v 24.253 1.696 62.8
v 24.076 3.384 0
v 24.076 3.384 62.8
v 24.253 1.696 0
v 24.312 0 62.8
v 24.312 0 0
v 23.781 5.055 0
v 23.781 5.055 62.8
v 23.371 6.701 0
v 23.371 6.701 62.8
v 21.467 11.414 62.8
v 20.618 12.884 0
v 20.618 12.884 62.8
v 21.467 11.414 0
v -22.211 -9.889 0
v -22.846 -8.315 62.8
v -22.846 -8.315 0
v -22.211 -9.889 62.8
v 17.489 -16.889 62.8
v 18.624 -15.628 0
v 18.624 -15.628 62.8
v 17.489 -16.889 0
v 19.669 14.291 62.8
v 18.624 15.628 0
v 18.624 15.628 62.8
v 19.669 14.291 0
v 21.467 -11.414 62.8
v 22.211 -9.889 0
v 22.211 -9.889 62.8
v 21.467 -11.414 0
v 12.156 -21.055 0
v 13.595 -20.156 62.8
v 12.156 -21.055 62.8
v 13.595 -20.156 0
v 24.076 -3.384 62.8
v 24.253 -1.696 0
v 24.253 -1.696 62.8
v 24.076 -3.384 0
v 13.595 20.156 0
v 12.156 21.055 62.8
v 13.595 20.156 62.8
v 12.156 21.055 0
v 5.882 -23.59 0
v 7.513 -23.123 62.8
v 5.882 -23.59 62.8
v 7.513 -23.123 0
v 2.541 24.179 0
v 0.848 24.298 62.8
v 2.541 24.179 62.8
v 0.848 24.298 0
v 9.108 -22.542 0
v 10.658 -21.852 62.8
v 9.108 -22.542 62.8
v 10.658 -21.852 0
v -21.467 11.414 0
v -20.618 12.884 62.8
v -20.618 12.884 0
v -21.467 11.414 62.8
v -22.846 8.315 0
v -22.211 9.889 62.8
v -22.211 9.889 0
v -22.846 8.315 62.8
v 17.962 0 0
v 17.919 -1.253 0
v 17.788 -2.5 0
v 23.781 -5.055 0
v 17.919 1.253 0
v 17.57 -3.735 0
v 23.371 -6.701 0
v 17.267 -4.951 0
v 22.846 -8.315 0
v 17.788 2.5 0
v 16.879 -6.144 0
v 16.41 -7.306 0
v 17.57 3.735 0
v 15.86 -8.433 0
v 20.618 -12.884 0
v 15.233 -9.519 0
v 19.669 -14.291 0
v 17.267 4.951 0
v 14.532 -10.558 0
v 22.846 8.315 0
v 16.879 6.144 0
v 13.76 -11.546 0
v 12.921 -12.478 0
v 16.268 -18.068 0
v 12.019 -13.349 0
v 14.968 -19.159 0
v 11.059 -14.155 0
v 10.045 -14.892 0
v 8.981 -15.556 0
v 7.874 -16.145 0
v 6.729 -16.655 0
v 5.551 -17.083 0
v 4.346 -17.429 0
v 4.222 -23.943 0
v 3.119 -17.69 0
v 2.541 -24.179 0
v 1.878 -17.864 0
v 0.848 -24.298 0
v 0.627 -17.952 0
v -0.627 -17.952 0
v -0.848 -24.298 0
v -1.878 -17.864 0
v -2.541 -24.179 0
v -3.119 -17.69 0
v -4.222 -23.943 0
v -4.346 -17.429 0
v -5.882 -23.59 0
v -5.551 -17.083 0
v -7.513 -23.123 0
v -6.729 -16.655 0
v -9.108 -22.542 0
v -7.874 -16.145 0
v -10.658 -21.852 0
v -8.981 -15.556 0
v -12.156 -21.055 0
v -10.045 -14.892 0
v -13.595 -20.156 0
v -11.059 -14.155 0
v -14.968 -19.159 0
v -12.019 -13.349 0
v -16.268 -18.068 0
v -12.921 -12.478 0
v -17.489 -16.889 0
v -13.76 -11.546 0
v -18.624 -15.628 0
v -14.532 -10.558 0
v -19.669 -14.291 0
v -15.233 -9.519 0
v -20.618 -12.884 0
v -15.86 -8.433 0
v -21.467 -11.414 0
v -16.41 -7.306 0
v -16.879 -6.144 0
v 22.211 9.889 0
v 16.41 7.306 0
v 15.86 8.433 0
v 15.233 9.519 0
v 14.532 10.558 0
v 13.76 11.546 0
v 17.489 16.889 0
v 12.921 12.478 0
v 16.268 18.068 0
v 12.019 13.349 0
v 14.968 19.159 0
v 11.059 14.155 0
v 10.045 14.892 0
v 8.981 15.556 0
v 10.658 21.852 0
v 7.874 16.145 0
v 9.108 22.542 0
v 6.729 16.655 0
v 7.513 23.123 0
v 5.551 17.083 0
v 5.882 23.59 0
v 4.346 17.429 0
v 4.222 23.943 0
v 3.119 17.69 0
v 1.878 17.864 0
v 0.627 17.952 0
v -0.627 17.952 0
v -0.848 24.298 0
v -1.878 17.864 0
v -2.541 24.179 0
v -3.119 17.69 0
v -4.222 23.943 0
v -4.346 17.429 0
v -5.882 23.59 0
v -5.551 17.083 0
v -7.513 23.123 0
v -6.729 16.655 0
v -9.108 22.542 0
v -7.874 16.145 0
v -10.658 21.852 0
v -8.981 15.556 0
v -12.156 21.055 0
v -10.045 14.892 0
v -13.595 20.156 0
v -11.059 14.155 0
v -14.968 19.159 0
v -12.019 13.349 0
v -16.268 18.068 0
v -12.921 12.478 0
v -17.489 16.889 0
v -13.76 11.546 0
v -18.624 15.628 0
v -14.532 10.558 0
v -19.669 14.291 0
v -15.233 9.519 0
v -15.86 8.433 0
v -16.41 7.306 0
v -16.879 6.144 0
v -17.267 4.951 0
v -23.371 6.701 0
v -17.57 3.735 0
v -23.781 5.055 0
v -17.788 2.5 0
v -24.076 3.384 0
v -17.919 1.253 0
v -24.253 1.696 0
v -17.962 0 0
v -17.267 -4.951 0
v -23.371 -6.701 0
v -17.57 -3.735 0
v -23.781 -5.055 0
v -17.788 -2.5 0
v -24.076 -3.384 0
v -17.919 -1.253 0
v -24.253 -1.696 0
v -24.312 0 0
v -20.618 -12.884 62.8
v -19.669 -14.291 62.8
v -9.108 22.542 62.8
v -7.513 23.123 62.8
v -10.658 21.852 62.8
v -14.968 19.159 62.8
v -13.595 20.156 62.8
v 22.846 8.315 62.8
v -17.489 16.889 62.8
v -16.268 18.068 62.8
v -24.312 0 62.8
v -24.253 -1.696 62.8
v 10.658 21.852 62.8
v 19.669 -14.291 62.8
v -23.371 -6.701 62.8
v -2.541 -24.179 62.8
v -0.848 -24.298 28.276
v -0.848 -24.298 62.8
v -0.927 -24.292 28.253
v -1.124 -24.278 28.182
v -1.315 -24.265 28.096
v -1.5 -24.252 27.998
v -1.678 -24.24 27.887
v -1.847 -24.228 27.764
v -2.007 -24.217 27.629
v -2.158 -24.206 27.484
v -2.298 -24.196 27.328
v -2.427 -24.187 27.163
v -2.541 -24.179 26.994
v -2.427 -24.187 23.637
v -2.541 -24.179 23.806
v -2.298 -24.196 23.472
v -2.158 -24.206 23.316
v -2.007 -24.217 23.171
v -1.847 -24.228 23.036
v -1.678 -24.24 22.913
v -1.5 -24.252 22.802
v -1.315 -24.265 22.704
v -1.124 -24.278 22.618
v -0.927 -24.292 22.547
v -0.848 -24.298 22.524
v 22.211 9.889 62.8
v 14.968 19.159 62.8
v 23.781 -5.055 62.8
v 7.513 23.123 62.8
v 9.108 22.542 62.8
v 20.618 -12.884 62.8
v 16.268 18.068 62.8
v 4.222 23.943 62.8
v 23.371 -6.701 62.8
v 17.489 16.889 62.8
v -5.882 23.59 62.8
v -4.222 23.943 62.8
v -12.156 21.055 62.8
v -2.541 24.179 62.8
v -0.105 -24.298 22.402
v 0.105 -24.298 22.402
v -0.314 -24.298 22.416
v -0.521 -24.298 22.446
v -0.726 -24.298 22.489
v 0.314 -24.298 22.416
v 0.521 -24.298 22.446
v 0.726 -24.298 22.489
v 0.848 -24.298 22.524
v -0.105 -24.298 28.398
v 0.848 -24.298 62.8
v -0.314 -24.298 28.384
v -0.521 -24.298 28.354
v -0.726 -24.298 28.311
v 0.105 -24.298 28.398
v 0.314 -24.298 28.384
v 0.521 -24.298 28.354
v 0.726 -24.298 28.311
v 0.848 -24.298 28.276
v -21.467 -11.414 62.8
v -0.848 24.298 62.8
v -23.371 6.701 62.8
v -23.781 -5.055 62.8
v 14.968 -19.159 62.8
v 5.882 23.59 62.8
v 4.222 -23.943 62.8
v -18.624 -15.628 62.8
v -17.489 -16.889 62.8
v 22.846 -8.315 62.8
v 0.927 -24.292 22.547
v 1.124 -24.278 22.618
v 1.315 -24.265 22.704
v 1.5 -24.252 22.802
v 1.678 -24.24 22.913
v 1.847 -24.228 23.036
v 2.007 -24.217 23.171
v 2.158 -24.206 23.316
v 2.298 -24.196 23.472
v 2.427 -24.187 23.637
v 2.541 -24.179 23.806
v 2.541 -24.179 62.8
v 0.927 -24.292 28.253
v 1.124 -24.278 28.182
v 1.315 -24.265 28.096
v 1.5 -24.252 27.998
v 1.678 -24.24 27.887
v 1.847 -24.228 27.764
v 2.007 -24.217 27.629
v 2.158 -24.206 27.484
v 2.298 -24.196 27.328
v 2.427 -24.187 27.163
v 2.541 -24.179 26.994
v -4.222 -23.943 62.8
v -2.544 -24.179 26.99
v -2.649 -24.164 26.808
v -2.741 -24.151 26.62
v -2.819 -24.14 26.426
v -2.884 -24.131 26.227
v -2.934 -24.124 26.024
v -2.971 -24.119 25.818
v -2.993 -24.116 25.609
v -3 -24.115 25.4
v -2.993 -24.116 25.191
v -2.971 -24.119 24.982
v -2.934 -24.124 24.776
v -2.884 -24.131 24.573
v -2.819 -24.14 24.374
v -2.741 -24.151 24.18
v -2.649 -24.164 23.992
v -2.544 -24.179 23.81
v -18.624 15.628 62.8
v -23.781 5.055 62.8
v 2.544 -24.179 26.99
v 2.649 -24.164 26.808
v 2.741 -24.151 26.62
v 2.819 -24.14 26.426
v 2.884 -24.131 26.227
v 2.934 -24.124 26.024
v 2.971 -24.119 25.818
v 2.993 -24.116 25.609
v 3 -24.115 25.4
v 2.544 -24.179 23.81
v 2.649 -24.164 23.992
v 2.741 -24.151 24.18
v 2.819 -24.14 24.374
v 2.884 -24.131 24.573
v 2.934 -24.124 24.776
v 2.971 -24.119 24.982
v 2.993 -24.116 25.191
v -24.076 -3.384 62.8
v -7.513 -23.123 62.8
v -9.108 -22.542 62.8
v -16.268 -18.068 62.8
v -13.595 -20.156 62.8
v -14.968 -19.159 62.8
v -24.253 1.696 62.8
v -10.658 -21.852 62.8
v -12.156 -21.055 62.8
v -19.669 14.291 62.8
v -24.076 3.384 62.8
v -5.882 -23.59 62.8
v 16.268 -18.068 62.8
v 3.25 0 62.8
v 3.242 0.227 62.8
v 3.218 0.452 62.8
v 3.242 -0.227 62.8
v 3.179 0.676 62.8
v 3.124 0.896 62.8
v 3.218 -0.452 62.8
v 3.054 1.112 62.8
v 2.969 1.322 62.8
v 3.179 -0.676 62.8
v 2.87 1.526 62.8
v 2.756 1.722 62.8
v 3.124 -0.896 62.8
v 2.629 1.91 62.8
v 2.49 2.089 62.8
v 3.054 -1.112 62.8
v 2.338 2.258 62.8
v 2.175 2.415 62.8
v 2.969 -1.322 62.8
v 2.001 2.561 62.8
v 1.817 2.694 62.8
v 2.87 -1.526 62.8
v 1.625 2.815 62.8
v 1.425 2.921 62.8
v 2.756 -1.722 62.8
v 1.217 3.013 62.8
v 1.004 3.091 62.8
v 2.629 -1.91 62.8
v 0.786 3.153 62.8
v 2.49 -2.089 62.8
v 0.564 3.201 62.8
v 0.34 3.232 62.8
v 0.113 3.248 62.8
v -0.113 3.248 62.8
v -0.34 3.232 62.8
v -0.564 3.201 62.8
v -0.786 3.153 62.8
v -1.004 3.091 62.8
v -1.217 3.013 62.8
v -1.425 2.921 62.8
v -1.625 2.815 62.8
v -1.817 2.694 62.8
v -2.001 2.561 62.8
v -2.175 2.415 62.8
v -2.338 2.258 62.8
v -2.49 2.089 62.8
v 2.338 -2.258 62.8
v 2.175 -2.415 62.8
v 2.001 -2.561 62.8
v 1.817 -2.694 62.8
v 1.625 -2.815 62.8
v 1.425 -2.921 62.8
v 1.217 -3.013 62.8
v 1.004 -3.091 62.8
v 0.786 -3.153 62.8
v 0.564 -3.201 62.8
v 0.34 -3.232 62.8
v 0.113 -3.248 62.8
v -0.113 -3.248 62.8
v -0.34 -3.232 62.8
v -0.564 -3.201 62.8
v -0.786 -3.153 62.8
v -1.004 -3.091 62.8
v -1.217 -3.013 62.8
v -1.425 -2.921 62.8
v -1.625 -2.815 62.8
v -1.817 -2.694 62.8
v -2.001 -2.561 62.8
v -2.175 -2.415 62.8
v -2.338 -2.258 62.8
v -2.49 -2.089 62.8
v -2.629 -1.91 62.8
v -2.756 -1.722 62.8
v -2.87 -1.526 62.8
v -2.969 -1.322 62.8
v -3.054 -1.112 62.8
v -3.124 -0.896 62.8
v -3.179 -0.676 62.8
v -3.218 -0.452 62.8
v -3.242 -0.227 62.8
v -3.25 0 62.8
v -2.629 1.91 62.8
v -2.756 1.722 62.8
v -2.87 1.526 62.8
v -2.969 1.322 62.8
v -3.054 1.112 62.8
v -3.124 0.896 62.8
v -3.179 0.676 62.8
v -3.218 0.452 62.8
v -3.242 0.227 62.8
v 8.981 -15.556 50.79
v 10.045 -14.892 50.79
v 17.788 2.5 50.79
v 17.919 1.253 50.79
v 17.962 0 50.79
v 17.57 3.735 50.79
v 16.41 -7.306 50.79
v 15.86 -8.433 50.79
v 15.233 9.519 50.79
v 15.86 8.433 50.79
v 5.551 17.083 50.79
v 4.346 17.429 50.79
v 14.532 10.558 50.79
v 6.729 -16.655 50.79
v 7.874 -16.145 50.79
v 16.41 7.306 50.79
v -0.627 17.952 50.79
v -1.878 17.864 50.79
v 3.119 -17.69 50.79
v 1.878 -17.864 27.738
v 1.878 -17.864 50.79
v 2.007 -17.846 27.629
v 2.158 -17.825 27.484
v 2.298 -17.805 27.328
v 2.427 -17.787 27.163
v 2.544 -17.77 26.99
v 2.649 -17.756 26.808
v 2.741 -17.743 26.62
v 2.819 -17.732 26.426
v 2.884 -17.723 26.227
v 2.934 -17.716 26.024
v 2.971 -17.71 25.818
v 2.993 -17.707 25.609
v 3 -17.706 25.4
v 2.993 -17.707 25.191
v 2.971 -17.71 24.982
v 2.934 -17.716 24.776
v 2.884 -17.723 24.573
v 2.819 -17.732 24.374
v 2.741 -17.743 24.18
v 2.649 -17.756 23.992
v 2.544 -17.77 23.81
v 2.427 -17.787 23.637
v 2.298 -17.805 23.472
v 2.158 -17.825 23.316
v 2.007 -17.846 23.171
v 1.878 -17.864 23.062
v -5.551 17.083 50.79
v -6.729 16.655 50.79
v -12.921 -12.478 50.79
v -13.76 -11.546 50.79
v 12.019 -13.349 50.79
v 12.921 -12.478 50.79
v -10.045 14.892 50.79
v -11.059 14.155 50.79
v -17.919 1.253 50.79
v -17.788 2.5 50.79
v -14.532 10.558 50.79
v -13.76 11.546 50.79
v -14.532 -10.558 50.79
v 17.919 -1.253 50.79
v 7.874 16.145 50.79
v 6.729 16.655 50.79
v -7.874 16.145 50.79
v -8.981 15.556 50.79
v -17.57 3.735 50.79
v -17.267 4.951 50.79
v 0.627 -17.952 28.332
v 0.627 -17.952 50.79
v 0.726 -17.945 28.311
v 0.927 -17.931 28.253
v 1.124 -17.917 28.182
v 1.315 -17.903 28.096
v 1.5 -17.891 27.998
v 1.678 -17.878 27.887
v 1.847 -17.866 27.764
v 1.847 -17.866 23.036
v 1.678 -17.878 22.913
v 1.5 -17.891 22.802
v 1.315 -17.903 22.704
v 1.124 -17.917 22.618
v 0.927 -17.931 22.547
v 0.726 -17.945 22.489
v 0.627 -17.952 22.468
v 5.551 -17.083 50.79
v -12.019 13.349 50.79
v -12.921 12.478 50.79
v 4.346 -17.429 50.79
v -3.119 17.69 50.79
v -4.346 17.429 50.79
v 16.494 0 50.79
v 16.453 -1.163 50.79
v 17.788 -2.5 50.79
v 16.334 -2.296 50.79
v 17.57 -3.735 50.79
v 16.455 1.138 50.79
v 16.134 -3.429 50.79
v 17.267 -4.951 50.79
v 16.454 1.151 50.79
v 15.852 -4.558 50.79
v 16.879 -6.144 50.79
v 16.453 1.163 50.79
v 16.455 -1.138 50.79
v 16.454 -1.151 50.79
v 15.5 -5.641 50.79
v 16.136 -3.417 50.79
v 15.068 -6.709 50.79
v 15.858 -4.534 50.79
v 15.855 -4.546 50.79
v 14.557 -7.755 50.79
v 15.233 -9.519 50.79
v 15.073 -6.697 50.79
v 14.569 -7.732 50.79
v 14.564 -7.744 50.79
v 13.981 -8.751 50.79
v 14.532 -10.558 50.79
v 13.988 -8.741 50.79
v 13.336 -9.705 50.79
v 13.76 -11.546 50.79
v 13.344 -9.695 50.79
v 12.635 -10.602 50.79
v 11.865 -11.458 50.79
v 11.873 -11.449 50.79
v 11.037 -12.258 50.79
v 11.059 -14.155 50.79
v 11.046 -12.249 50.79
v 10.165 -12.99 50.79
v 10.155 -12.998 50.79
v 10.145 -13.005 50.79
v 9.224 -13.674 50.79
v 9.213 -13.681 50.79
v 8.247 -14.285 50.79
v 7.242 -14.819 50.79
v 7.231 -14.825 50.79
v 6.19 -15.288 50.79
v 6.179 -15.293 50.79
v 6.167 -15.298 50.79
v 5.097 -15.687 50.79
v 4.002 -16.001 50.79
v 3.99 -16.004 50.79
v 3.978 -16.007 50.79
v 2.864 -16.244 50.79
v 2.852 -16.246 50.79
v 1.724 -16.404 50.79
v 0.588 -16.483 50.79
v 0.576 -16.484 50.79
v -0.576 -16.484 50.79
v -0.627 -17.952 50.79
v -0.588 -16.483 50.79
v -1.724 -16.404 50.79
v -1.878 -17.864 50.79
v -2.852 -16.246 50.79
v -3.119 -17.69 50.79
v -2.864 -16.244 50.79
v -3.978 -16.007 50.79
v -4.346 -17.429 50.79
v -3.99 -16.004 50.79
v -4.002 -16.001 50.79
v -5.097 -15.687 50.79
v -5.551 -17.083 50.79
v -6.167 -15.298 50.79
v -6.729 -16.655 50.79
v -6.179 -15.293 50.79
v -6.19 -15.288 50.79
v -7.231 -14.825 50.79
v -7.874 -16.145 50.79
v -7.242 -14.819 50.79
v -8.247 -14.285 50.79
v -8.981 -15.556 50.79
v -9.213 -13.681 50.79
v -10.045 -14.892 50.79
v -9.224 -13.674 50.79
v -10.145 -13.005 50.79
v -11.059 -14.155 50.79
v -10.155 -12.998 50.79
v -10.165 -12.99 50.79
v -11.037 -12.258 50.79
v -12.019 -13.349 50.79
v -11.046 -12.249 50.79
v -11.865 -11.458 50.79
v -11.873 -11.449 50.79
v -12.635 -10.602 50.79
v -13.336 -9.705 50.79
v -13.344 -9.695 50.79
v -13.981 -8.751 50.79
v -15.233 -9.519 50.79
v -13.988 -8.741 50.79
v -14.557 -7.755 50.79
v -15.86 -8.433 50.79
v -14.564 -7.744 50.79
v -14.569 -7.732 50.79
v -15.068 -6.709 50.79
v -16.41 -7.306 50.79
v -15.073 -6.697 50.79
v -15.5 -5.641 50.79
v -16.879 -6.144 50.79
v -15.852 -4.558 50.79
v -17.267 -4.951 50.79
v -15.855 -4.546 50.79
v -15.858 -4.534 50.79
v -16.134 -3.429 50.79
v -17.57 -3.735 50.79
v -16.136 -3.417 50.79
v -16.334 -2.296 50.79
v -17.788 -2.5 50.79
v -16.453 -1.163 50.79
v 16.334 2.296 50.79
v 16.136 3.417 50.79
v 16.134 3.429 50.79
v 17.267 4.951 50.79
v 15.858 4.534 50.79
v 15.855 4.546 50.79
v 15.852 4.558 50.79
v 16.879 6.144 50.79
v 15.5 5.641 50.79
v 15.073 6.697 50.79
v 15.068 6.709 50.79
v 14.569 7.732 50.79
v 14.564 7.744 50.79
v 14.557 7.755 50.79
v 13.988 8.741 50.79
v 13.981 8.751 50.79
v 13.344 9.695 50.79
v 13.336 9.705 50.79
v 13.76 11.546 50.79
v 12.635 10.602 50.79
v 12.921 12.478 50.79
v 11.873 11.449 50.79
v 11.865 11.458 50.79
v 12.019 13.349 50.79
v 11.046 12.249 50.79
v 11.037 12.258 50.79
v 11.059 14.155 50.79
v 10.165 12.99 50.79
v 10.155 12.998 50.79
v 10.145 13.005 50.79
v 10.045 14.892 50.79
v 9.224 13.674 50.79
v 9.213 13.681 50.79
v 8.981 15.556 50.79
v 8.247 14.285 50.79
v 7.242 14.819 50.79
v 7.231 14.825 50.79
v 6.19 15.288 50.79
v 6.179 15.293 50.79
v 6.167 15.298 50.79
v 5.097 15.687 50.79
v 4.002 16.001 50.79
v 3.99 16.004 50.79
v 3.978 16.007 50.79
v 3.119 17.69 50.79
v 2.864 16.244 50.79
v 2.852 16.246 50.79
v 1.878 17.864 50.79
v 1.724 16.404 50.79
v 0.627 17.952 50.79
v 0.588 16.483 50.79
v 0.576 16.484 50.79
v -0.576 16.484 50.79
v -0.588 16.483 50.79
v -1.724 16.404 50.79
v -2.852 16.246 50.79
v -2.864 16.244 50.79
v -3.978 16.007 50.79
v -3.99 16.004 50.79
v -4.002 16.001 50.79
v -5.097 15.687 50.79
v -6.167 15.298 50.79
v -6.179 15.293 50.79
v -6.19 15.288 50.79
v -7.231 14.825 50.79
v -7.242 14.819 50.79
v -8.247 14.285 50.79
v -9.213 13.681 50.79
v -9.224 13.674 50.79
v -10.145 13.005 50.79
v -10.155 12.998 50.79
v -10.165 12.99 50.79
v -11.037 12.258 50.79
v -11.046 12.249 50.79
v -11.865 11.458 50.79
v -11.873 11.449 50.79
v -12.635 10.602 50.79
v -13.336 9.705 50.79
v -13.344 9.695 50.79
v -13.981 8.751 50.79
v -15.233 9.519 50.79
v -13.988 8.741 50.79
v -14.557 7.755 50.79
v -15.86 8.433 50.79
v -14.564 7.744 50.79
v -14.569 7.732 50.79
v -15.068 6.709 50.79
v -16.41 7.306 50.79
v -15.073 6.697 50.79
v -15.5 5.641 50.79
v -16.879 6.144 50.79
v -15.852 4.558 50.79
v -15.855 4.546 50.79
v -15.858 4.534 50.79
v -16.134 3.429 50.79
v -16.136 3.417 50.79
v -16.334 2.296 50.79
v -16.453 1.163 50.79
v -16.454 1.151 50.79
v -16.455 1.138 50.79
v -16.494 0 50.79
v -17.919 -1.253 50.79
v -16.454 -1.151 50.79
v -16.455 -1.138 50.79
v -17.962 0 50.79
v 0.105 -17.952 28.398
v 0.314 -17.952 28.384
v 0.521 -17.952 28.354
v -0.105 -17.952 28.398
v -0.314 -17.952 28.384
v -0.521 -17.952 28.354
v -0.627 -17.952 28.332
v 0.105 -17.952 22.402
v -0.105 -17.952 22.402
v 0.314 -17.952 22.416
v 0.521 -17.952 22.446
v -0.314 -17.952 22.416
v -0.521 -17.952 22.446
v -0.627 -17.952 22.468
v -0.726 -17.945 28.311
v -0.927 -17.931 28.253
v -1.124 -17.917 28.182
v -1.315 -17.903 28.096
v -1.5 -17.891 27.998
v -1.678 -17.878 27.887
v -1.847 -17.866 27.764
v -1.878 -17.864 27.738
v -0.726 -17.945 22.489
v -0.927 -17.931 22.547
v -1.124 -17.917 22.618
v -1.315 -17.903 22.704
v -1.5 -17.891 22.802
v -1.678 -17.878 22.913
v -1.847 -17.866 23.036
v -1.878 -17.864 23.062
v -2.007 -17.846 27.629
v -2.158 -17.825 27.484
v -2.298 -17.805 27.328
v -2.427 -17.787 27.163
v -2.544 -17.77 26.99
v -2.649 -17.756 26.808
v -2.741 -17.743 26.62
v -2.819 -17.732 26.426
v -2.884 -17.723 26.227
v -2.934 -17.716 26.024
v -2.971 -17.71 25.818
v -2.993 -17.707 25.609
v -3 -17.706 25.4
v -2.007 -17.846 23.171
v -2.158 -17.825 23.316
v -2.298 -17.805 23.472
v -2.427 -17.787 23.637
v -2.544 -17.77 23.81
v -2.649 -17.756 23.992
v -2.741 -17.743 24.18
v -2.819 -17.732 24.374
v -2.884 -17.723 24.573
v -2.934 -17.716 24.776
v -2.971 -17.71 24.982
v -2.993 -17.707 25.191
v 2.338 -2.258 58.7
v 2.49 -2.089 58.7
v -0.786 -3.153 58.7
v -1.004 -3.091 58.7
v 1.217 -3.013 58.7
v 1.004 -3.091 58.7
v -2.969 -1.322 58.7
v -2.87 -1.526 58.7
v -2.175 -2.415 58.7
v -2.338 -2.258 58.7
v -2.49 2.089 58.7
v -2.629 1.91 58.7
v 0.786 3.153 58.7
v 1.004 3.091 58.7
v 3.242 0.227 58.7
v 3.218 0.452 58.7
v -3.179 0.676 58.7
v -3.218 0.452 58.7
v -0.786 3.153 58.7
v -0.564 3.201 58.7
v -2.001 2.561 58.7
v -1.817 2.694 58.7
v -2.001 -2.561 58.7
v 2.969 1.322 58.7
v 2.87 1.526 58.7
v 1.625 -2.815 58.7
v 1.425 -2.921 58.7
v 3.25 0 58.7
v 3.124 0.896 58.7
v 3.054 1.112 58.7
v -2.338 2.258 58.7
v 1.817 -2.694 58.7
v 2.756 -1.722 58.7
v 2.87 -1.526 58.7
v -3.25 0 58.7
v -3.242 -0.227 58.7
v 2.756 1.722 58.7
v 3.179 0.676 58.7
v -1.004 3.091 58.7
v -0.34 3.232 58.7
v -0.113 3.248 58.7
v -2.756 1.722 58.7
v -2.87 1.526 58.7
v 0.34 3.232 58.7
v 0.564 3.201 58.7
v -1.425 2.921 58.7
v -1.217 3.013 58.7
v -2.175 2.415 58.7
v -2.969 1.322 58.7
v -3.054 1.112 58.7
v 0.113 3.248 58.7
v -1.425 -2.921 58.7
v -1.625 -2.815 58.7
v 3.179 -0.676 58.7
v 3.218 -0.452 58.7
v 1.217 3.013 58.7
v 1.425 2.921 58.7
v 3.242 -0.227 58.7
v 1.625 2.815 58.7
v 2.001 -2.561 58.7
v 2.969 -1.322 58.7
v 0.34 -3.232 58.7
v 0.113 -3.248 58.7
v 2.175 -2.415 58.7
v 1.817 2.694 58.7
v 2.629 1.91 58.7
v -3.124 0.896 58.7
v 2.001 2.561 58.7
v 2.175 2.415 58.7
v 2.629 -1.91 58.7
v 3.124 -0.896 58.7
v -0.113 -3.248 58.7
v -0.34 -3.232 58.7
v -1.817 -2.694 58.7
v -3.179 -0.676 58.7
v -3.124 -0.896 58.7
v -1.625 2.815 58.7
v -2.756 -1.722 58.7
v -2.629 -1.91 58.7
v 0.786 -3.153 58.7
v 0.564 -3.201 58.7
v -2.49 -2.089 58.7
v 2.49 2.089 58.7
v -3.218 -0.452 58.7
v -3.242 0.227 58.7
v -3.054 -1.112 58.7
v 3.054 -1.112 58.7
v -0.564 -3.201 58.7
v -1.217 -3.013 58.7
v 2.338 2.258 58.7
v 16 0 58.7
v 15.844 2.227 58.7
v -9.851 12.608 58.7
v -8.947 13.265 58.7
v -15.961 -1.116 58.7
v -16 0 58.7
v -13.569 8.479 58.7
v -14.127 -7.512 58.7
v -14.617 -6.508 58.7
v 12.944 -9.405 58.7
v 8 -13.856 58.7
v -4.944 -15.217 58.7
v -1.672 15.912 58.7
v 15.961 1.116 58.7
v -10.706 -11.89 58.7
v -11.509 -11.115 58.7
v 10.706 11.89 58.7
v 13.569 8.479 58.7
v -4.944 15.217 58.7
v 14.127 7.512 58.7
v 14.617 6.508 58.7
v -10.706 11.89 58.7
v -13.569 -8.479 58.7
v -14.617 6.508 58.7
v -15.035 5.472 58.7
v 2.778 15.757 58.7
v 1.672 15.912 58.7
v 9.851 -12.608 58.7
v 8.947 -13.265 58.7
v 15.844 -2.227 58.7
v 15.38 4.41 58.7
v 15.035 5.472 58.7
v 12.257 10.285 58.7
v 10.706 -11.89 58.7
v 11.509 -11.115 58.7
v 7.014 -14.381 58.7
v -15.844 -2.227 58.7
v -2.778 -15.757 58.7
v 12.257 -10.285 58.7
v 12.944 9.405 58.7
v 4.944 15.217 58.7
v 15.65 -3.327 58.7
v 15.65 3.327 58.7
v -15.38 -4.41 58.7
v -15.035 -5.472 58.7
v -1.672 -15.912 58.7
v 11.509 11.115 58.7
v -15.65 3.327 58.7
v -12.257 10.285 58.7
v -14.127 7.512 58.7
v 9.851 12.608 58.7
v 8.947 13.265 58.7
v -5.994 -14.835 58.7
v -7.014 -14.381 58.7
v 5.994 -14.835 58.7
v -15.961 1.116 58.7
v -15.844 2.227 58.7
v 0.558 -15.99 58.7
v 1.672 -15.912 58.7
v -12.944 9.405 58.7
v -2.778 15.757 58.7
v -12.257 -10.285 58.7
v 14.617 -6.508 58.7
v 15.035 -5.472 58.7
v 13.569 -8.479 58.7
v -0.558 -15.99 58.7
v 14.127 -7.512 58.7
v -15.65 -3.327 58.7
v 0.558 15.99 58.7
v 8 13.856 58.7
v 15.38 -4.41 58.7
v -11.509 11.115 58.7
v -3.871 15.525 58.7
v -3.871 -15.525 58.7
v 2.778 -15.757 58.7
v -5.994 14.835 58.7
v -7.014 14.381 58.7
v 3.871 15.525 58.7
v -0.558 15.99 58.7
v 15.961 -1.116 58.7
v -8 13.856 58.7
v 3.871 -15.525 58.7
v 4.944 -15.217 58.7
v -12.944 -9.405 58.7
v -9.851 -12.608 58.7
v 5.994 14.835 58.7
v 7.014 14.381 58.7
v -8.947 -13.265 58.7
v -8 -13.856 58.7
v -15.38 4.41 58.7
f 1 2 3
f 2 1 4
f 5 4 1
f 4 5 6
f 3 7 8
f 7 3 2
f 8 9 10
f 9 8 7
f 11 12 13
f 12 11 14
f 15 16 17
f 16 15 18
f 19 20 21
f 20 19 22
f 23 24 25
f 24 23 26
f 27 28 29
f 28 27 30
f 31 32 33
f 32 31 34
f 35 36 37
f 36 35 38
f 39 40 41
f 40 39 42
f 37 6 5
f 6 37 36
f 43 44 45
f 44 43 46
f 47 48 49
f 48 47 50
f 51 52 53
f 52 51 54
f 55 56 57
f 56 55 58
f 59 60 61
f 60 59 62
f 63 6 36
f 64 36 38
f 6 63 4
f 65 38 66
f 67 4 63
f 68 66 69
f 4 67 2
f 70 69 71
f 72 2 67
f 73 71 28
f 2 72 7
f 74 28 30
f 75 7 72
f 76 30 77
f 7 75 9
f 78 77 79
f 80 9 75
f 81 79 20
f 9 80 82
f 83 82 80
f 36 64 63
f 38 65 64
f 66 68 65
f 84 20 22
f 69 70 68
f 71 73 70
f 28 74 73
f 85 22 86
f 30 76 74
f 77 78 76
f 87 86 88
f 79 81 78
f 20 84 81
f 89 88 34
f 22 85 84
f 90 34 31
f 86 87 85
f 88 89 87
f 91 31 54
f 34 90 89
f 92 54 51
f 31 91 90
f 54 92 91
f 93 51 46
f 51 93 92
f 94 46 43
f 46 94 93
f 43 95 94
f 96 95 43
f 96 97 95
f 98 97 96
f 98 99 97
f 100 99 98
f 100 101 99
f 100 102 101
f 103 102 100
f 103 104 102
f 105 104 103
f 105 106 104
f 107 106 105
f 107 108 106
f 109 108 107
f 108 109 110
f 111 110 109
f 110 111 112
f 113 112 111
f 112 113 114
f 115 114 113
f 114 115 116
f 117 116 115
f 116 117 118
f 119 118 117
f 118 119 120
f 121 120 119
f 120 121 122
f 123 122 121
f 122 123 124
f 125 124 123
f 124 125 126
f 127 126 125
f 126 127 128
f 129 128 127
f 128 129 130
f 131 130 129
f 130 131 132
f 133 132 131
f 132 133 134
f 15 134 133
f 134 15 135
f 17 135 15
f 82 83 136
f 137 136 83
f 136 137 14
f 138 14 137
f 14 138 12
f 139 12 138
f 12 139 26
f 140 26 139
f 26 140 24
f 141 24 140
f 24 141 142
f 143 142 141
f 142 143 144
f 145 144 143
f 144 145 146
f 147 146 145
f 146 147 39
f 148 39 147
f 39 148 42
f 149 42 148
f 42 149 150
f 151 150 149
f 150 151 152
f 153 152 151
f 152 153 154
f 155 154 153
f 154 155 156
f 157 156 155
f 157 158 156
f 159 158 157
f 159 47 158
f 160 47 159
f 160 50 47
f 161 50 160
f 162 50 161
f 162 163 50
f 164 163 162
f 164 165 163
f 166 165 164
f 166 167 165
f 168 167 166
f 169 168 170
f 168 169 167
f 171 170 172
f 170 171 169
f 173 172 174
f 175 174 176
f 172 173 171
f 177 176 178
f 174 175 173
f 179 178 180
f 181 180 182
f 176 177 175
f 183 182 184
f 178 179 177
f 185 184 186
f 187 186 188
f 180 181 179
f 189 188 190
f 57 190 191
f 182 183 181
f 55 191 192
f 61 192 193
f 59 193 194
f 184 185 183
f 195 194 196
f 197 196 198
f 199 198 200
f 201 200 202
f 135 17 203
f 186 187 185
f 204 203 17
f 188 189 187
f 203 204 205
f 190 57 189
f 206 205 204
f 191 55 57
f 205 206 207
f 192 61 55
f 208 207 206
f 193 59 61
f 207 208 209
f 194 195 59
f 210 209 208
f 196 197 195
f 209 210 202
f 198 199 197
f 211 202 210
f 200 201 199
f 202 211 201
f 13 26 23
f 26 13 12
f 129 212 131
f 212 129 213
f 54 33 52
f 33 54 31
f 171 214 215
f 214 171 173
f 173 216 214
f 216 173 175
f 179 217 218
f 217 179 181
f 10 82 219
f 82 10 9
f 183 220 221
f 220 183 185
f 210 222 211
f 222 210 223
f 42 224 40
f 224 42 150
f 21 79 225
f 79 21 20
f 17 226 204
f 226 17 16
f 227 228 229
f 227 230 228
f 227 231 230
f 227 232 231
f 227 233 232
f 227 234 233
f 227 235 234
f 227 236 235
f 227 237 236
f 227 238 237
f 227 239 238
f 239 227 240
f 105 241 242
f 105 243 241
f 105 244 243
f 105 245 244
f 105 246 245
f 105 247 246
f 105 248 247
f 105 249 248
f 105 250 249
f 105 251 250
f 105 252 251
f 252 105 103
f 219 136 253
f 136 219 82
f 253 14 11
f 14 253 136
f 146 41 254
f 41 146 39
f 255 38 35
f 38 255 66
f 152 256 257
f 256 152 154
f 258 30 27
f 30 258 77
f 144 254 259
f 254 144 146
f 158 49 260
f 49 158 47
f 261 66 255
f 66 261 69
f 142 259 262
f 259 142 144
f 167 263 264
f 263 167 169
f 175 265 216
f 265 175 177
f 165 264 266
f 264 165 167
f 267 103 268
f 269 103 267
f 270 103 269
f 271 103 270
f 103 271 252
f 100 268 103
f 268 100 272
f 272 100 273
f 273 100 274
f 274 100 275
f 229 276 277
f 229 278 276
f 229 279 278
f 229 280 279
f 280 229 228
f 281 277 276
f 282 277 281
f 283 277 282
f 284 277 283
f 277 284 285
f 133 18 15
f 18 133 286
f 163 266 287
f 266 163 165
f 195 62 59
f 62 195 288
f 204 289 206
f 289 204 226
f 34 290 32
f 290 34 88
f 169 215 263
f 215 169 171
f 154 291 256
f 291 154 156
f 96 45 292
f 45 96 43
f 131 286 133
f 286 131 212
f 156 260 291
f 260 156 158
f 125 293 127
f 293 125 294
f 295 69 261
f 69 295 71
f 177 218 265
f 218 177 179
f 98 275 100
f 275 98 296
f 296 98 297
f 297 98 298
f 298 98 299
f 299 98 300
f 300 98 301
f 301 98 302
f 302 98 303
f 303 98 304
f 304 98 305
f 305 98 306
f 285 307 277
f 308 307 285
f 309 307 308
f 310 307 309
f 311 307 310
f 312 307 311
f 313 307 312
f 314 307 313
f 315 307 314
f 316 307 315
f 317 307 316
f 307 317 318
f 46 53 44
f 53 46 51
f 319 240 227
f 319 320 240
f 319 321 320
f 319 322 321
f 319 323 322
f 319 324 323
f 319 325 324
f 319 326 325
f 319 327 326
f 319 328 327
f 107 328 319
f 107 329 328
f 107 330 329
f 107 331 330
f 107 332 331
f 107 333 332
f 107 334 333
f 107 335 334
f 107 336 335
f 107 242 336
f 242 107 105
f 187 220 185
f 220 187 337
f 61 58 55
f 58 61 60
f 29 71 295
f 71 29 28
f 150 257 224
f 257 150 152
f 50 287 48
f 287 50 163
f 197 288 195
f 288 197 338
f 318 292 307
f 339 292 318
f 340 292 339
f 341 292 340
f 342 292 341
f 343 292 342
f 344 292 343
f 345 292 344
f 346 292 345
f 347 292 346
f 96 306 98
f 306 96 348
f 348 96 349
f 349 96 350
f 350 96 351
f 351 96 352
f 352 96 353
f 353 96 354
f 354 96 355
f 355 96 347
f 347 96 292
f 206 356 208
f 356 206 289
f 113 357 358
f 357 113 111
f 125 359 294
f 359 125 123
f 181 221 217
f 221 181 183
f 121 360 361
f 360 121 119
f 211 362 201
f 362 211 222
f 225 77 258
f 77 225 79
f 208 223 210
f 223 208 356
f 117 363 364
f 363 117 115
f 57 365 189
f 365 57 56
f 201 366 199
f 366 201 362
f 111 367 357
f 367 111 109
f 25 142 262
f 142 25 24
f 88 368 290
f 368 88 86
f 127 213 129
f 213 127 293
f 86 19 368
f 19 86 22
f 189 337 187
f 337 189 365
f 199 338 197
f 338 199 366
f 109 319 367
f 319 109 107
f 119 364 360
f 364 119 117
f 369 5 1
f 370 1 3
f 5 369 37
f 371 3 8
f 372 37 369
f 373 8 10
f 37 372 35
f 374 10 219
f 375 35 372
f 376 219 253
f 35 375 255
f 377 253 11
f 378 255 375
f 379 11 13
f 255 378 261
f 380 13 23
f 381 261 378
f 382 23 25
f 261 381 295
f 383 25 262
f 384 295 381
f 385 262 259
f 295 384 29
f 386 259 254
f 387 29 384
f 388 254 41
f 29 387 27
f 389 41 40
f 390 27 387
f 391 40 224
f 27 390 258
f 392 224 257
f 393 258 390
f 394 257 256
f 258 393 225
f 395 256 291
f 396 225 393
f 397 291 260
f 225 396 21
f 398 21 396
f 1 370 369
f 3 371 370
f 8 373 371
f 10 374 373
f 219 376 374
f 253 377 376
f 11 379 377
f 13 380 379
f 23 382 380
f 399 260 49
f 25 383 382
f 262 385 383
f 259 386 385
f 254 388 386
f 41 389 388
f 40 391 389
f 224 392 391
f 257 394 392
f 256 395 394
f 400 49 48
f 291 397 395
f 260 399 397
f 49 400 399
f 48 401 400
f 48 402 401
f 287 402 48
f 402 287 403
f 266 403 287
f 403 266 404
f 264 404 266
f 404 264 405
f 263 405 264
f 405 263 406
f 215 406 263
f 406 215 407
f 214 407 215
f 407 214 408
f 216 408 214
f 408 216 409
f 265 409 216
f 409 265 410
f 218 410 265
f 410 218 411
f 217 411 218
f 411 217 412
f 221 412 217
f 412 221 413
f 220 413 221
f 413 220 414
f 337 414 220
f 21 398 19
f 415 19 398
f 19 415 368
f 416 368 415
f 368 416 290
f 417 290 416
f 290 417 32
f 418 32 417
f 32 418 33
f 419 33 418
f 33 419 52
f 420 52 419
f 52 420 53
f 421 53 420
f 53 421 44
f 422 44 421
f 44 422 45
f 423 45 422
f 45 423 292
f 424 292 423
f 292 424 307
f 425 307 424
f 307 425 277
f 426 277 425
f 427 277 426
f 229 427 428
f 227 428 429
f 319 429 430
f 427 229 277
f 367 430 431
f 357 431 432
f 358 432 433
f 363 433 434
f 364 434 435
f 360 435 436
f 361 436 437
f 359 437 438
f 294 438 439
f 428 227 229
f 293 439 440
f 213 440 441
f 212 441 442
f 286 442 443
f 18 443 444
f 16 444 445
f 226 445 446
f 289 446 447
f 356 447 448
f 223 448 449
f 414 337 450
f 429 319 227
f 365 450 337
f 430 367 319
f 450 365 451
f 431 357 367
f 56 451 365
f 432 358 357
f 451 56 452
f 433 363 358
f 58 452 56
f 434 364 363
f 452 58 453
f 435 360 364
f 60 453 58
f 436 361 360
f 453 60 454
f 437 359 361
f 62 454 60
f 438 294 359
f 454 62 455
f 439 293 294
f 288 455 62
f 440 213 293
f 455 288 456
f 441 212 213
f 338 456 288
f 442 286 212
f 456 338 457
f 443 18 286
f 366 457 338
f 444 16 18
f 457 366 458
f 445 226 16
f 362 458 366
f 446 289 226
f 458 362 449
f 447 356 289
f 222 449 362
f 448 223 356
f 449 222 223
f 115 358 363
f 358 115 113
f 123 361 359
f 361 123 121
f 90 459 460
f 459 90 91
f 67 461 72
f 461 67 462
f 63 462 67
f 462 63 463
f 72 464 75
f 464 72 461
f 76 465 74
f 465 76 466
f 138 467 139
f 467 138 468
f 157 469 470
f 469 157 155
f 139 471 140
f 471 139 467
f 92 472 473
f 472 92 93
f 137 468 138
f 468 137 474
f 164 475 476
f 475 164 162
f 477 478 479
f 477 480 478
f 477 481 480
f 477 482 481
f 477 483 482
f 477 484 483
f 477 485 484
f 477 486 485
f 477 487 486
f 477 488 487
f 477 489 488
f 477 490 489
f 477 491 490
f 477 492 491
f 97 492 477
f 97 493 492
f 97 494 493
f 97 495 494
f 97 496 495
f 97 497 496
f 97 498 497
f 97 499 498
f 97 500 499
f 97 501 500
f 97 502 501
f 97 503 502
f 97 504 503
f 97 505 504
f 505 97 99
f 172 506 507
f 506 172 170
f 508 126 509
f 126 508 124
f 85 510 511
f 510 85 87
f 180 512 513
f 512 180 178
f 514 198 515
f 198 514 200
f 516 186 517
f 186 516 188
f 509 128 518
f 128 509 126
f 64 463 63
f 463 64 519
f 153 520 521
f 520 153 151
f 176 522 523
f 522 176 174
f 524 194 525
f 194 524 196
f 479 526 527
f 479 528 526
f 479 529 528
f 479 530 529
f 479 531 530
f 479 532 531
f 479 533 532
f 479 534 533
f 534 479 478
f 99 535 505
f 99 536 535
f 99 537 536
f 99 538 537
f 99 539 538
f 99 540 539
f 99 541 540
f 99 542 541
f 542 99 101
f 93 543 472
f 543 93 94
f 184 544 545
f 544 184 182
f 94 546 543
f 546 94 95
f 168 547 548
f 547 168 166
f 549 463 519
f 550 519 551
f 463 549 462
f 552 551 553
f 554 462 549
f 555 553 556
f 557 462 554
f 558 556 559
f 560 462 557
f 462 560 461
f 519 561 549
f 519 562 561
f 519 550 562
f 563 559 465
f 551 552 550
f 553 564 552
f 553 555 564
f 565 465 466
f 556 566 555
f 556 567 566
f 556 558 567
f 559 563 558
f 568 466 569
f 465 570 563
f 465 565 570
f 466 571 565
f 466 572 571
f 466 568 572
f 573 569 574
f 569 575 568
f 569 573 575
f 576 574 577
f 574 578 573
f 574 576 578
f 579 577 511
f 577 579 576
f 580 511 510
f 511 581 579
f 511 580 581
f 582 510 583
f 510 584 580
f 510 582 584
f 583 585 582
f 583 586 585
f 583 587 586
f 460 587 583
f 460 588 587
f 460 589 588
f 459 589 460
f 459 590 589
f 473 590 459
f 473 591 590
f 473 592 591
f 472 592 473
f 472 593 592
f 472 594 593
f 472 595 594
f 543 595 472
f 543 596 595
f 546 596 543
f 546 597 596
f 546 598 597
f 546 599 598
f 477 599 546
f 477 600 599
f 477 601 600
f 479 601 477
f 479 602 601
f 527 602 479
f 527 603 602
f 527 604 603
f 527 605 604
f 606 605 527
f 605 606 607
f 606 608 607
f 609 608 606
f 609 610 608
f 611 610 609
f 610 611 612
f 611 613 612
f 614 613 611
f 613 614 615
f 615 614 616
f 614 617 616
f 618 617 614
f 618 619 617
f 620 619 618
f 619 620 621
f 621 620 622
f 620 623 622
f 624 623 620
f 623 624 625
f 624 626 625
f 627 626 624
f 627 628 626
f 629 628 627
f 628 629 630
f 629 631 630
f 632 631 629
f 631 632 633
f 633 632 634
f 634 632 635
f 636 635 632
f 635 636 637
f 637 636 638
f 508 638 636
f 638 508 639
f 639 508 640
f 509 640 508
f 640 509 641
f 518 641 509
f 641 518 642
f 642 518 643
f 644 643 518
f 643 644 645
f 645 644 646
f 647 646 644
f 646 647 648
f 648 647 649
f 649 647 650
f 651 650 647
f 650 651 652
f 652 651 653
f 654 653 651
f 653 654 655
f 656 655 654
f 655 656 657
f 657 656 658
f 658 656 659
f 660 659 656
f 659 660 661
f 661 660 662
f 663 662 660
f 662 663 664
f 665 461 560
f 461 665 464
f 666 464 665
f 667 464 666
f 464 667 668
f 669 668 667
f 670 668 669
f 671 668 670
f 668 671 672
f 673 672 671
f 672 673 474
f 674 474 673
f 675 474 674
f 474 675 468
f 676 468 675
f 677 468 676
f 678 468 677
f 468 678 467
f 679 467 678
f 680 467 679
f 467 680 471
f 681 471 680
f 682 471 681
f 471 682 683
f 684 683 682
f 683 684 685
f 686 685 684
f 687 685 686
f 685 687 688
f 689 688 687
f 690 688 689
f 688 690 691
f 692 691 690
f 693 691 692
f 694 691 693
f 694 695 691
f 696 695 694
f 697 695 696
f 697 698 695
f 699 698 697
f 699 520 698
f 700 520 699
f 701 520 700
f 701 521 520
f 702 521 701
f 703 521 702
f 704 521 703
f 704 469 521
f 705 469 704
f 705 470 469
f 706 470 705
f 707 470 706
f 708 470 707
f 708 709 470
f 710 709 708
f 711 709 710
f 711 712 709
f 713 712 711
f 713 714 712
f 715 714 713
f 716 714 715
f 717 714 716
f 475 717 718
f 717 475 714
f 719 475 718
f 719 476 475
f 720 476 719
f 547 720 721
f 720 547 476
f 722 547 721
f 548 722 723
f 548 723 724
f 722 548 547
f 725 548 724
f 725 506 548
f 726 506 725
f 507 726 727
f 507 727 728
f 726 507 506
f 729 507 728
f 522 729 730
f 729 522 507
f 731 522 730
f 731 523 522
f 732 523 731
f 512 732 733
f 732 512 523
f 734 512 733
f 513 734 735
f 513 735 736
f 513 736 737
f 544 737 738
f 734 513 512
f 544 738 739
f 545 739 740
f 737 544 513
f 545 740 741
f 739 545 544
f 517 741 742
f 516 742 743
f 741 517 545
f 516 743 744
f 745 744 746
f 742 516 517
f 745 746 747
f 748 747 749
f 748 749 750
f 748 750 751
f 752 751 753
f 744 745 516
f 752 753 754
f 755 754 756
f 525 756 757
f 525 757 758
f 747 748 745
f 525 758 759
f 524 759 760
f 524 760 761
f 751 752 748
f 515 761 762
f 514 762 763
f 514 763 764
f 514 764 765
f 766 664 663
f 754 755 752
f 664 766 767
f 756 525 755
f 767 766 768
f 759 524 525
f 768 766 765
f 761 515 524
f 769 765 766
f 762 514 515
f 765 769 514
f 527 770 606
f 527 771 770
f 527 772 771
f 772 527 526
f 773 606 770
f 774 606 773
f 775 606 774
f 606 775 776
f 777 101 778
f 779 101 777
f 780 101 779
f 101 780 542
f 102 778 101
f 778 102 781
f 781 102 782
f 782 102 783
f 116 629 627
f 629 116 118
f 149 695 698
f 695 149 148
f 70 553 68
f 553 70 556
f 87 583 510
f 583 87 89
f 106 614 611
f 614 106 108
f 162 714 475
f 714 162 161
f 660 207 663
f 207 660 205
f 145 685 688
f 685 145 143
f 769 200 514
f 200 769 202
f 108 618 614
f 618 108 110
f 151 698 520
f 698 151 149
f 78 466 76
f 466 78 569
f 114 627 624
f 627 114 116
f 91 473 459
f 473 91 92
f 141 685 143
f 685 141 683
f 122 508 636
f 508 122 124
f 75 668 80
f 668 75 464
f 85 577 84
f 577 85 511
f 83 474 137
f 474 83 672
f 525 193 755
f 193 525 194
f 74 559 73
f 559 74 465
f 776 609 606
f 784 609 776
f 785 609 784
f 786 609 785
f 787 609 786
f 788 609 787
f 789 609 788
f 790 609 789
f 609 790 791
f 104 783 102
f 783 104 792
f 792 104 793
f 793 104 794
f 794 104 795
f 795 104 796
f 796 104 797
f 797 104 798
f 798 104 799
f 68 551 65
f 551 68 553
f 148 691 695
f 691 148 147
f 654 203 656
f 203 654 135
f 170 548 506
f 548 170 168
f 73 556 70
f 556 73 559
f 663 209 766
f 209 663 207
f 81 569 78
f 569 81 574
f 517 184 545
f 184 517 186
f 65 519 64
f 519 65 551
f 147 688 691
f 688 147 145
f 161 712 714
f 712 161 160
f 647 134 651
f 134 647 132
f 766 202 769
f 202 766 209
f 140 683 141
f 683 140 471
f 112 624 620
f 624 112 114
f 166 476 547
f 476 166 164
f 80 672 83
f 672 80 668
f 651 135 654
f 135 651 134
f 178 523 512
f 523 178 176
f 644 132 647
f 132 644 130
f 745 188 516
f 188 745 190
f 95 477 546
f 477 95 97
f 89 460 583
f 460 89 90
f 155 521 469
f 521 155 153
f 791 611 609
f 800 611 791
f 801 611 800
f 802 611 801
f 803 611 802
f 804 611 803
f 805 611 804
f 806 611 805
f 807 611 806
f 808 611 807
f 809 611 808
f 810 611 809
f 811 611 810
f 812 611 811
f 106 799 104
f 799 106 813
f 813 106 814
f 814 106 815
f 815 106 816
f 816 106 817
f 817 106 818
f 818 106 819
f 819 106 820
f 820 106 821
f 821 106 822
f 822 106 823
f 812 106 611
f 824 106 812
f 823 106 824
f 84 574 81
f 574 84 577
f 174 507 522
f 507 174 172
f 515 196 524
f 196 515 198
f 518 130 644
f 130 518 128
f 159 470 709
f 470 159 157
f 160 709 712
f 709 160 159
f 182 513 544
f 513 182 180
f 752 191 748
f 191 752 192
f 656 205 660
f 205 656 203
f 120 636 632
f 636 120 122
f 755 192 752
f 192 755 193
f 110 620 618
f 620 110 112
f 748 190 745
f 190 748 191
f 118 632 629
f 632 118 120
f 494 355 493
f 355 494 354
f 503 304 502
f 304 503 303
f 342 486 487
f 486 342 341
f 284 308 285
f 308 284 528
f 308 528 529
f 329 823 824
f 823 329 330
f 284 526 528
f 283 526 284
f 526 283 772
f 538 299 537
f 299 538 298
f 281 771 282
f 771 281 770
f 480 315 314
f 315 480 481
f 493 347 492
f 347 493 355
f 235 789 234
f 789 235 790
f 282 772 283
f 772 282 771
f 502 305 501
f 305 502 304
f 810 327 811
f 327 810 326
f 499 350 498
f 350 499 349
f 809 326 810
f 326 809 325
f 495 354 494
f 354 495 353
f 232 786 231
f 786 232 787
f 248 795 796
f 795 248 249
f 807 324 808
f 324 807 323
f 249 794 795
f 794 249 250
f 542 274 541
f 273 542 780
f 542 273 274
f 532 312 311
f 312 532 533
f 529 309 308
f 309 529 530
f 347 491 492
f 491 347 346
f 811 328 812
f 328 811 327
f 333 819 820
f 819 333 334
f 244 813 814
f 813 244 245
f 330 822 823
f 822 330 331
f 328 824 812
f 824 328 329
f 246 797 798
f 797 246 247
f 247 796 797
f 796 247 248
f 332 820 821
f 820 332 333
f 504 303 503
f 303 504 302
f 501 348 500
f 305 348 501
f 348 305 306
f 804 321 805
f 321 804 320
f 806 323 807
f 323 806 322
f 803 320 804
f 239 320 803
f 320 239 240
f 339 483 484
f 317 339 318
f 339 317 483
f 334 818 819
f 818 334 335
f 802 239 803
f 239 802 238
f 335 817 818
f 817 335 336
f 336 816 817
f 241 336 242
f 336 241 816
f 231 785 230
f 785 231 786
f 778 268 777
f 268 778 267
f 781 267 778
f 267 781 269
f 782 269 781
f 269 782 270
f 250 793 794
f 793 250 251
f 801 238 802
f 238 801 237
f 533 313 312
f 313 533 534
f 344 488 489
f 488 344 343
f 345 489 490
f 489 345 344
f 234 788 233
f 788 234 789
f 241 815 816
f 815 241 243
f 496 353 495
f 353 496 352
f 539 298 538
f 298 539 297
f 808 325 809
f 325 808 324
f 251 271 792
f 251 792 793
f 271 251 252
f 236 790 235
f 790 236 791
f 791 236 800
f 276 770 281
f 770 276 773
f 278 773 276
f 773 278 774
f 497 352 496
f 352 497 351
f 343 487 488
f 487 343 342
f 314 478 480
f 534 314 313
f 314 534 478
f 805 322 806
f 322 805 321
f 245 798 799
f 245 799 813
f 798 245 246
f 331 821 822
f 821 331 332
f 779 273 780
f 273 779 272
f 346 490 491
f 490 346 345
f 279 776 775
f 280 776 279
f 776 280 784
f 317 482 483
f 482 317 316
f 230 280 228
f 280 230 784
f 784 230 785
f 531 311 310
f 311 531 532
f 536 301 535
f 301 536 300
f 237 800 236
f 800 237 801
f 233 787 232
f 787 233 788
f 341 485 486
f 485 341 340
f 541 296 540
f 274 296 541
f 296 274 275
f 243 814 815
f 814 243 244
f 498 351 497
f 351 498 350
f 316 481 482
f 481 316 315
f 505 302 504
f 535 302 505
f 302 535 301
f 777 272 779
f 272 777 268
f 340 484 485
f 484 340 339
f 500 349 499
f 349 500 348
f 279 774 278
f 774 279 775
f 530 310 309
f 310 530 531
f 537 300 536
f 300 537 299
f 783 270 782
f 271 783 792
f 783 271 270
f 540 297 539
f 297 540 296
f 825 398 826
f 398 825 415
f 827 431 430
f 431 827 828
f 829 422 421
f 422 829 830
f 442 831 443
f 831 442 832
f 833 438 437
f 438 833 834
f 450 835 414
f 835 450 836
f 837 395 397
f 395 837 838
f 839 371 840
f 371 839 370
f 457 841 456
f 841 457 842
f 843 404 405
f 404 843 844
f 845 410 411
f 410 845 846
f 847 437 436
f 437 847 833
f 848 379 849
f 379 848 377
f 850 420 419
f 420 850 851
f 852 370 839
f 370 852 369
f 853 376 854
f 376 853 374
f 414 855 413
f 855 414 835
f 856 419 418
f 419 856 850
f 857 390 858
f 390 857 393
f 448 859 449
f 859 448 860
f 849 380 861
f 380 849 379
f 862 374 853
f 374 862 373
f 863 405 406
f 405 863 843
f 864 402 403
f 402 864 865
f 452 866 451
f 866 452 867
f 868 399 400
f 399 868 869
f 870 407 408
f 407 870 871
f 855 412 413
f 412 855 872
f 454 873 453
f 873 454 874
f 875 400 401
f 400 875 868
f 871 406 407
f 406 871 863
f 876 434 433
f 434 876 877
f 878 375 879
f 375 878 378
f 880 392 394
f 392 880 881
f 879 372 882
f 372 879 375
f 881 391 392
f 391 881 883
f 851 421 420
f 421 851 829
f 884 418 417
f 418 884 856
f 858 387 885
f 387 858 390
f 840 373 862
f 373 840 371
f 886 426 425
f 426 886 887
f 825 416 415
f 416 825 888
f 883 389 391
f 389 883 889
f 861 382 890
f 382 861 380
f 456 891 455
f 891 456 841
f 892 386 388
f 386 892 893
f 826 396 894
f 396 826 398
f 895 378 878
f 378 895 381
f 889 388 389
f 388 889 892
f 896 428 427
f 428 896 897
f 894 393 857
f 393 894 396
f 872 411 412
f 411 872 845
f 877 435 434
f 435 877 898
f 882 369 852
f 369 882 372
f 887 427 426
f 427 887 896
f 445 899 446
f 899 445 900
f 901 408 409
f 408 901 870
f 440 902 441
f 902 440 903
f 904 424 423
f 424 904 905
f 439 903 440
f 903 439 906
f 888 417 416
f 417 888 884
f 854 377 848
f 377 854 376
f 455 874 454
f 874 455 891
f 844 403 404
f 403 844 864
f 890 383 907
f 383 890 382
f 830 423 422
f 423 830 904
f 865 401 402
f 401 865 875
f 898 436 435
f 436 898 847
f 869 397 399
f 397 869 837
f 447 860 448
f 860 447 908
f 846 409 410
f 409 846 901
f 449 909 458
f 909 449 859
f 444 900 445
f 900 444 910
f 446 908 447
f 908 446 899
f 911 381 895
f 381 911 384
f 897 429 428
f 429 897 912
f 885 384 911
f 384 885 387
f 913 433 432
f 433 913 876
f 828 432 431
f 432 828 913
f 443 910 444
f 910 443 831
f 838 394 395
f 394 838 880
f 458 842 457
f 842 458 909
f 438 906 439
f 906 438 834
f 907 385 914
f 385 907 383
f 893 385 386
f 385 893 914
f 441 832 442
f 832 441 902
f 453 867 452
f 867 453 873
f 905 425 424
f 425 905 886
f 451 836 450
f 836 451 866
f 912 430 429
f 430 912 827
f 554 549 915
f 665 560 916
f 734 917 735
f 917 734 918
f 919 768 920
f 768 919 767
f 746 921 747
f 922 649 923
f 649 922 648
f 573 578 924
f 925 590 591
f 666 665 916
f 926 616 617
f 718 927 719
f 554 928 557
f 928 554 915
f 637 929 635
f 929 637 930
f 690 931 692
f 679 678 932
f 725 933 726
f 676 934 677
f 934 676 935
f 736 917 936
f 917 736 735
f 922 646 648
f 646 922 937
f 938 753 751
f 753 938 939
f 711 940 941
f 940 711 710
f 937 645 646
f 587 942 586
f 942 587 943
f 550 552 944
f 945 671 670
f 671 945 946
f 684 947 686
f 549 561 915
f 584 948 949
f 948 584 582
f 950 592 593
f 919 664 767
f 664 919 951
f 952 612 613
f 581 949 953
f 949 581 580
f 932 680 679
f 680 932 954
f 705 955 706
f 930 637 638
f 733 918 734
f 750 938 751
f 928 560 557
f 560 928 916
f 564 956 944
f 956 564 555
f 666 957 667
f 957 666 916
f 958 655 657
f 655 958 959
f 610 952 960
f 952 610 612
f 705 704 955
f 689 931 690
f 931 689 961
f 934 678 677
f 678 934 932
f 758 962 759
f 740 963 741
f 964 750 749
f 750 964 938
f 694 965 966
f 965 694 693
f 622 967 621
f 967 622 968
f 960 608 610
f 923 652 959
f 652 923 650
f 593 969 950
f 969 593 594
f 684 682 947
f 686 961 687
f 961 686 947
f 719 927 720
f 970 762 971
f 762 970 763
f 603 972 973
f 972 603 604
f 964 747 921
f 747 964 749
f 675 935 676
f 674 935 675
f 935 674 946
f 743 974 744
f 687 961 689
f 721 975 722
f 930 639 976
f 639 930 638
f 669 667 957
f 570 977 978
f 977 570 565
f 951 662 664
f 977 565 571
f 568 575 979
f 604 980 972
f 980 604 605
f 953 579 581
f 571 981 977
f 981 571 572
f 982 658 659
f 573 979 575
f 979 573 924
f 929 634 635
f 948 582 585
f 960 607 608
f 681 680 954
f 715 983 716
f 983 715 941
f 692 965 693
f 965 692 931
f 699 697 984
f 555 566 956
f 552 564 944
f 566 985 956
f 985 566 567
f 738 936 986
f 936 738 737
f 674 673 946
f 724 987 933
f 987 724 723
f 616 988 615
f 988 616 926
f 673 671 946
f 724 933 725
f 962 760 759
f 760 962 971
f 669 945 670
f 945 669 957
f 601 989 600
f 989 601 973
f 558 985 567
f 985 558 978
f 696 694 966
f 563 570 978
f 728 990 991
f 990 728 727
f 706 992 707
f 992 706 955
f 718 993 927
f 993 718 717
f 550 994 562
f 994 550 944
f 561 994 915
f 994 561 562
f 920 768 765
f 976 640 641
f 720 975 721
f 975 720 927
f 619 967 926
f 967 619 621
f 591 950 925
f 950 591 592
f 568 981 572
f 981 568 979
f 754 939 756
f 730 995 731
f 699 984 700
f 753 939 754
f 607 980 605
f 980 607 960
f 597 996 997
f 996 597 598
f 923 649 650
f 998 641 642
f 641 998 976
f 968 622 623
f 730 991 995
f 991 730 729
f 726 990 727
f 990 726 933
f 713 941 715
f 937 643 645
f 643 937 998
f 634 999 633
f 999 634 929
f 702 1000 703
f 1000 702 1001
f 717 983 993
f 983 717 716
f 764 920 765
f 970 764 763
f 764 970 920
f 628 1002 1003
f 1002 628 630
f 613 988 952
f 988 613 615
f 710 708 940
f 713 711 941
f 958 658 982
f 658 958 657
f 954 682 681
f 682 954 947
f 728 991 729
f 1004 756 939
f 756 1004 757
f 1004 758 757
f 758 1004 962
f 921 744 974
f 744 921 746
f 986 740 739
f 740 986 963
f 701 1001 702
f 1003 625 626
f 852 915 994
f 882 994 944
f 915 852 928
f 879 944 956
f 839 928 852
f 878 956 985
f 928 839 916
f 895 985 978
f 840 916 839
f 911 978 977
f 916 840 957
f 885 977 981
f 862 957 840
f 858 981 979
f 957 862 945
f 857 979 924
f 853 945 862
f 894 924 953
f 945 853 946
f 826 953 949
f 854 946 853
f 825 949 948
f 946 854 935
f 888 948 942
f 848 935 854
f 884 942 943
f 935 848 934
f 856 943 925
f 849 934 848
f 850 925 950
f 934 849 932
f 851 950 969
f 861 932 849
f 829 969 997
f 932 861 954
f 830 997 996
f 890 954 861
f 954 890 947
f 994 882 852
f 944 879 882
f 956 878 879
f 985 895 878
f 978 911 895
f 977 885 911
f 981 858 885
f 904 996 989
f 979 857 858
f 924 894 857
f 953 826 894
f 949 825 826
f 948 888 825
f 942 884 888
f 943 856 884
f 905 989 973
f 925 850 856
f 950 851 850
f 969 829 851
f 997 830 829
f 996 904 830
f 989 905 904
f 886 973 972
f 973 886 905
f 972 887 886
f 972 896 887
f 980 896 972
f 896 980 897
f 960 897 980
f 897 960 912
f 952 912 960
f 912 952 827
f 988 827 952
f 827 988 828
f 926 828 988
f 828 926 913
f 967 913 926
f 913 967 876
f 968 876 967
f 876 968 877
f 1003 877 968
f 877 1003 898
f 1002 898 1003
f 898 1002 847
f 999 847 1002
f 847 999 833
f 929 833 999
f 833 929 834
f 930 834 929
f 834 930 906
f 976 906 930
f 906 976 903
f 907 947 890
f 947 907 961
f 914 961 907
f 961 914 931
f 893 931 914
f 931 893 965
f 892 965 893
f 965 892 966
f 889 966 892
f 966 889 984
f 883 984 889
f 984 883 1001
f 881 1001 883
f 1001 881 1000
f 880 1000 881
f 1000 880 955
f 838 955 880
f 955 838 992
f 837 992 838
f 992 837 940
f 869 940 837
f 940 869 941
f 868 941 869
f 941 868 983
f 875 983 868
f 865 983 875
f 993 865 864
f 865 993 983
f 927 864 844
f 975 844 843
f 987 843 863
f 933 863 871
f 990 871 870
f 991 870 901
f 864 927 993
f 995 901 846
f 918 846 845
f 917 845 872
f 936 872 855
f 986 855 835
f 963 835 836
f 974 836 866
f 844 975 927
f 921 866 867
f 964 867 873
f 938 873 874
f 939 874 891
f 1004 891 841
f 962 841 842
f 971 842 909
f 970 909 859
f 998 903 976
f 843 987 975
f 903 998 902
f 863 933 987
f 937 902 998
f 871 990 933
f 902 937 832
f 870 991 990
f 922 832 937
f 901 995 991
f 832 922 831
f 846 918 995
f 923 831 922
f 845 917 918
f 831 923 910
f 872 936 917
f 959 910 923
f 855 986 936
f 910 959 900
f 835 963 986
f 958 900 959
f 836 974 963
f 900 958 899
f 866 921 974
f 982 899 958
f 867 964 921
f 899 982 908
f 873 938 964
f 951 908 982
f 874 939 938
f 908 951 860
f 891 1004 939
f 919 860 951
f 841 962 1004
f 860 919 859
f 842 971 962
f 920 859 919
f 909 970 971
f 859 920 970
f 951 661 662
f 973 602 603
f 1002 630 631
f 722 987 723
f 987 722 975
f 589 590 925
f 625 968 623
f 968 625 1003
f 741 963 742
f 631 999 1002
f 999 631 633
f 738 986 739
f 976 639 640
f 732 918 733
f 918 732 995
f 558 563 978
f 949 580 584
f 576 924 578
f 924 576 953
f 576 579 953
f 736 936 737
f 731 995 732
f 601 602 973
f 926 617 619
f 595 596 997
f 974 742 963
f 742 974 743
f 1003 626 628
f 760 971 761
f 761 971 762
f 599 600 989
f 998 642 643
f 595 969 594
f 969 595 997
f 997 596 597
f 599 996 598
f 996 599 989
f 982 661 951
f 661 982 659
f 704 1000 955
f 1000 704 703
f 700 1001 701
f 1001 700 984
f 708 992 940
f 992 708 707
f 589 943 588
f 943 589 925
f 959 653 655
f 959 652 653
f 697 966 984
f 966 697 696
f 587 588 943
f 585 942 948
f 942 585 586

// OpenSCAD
// Version 1 - Brian Bousman 6/30/2017
//    Modified the Vive mount to be a camera mount that slips
//    over the end of the tripod mount and has a mount screw
//    at the top.

$fn = 90;

in2mm = 25.4;

tripodDai = (1+3/8)*in2mm+1; 
mountHeight = 2.0*in2mm;
wallThickness = .25*in2mm;
topwallThickness = 12;

//mountHoleDistance = (2+5/8)*in2mm+4;
mountHoleDistance = 65;    // measured with calipers
mountX = (3.5)*in2mm;
mountHoleDia = 1/8*in2mm+.5;
mountHoledepth = (1.625)*in2mm;
tensionHoleDia = 6.0;

cameraHoleDia = 6.5;
ctrsinkdepth = 8;
ctrsinkdia = 32;


module center_tube()
{
    cylinder(d=tripodDai, h=mountHeight);
}



module mount()
{
    difference()
    {
        // main cylinder body
        #cylinder(d=tripodDai+2*wallThickness, h=mountHeight+topwallThickness);
        
        // hole in center for tripod pole
        translate([0,0,-0.01])center_tube();
        
        // tension screw hole
        translate([0,-(tripodDai+2*wallThickness)/2,mountHeight/2])rotate([90,0,-180])cylinder(d=tensionHoleDia, h=mountHoledepth);

        // camera mount screw hole
        translate([0,0,mountHeight-0.1])cylinder(d=cameraHoleDia, h=wallThickness*2);
        // counter sink the screw hole
        color("white")translate([0,0,mountHeight-0.1])cylinder(d1=ctrsinkdia+1, d2=ctrsinkdia, h=ctrsinkdepth);
    }
}

mount();
